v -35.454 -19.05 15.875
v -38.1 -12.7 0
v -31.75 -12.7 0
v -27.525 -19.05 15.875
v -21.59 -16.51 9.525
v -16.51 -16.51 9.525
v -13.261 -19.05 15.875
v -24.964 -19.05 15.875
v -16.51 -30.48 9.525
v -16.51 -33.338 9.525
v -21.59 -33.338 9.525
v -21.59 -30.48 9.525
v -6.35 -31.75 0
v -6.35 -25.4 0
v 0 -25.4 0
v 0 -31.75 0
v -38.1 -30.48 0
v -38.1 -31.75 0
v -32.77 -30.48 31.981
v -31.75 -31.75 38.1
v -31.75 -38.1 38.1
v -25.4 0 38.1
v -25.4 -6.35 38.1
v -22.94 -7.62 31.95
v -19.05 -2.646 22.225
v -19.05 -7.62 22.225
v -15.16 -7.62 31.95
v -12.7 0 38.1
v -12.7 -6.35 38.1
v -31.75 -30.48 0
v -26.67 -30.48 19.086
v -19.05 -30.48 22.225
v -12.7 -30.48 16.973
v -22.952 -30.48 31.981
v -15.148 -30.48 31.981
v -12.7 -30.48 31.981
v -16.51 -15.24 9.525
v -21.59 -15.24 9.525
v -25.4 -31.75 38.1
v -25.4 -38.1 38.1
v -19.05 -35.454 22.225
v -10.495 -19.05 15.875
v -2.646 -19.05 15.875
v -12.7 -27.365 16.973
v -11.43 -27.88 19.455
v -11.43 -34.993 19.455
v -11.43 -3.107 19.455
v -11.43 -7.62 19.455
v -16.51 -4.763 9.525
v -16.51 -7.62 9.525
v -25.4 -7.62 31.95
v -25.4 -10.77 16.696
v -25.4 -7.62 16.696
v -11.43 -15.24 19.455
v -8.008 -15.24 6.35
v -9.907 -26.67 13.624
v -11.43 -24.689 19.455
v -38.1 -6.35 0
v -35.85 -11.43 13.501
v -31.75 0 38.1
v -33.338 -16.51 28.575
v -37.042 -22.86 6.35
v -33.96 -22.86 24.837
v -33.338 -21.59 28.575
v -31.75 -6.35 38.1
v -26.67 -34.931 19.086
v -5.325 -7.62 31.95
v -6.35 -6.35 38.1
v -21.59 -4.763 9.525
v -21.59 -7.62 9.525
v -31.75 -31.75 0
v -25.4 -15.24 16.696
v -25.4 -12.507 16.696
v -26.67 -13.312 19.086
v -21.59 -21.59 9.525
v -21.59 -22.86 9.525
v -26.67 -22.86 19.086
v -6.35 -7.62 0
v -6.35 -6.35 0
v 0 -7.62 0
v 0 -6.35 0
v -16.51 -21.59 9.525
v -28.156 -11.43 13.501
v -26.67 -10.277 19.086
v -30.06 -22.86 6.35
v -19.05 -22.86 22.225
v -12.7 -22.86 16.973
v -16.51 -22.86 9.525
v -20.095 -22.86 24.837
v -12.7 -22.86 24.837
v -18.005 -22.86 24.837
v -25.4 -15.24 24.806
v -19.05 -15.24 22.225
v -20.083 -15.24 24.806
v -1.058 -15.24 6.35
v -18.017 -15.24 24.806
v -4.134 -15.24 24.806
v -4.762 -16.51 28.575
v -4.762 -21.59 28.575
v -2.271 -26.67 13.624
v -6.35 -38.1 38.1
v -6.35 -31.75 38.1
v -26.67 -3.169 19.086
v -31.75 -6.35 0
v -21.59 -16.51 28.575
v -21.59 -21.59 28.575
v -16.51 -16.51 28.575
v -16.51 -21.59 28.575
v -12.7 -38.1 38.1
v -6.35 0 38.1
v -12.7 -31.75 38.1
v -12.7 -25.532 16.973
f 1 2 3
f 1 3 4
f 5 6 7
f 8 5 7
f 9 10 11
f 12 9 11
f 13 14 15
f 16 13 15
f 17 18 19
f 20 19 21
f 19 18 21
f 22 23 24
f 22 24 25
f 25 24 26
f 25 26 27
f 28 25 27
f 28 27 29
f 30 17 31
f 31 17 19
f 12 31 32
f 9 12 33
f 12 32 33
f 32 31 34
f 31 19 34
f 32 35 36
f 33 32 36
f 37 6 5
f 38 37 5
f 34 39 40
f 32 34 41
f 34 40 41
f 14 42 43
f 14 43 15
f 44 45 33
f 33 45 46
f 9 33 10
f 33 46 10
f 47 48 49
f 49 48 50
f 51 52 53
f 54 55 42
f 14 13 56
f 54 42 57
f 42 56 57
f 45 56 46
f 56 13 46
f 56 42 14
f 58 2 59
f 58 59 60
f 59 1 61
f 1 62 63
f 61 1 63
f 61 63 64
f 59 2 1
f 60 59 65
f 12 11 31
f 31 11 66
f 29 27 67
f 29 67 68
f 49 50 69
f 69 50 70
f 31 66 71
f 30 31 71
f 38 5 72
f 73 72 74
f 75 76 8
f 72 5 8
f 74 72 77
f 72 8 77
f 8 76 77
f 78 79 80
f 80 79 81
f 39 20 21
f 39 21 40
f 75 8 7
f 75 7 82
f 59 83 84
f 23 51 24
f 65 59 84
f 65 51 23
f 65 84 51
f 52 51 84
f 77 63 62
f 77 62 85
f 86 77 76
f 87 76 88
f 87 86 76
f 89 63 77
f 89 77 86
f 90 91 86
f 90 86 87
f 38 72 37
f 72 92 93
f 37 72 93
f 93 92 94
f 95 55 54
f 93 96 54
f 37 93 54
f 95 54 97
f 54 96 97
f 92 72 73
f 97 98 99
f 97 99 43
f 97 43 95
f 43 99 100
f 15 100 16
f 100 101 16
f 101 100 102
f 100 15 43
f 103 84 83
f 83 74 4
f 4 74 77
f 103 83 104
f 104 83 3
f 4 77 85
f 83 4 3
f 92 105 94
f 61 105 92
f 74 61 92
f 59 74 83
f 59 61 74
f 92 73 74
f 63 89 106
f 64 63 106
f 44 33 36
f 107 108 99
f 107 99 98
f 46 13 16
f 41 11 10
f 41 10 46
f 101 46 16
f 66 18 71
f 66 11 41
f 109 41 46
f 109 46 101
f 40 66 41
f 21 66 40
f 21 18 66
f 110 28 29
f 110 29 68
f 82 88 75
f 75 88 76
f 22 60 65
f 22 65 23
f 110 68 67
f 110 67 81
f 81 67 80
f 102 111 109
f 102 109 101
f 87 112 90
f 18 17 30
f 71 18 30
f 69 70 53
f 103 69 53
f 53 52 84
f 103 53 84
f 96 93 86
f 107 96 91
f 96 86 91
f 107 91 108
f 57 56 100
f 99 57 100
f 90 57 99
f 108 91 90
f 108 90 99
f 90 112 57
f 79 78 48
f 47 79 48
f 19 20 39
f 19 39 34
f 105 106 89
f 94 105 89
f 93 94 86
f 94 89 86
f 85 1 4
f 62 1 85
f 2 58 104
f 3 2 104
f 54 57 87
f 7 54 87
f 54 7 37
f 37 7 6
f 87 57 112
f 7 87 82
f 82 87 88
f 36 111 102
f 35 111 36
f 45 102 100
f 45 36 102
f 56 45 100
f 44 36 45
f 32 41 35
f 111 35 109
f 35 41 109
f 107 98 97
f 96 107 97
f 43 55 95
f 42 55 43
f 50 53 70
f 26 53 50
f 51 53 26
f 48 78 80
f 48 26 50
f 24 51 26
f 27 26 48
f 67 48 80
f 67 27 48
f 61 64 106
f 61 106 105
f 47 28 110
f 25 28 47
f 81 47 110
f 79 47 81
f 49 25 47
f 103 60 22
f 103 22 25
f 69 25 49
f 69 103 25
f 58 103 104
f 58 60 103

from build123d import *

# Parameters (mm, degrees)
F0_W      = 38.1
F0_H      = 38.1
F1_DEPTH  = 38.1
F6_DEPTH  = 38.1
F8_DEPTH  = 38.1
F9_W      = 25.4
F9_H      = 7.62
F10_DEPTH = 38.1


with BuildPart() as f1:
    # F0 (on Front) → F1 (new body)
    with BuildSketch(Plane.XZ):
        with Locations((-19.05, 19.05)):
            Rectangle(F0_W, F0_H)
    extrude(amount=F1_DEPTH)

    # F5 (on offset) → F6 (cut)
    with BuildSketch(Plane.YZ.offset(-38.1)):
        Polygon((-11.43, 13.500985), (-6.35, 38.1), (-31.75, 38.1), (-26.67, 13.624078), (-21.59, 28.575), (-16.51, 28.575), align=None)
        Polygon((-25.4, 0), (-12.7, 0), (-19.05, 15.875), align=None)
        Polygon((-6.35, 0), (0, 0), (0, 38.1), align=None)
        Polygon((-31.75, 0), (-38.1, 38.1), (-38.1, 0), align=None)
    extrude(amount=F6_DEPTH, mode=Mode.SUBTRACT)

    # F7 (on offset) → F8 (cut)
    with BuildSketch(Plane.XZ.offset(38.1)):
        Polygon((-31.75, 0), (-6.35, 0), (-11.43, 19.455044), (-16.51, 9.525), (-21.59, 9.525), (-26.67, 19.085767), align=None)
        Polygon((-6.35, 38.1), (0, 0), (0, 38.1), align=None)
        Polygon((-19.05, 22.225), (-12.7, 38.1), (-25.4, 38.1), align=None)
        Polygon((-38.1, 38.1), (-38.1, 0), (-31.75, 38.1), align=None)
    extrude(amount=-F8_DEPTH, mode=Mode.SUBTRACT)

    # F9 (on offset) → F10 (cut)
    with BuildSketch(Plane.XY.offset(38.1)):
        with Locations((-12.7, -11.43)):
            Rectangle(F9_W, F9_H)
        with Locations((-25.4, -26.67)):
            Rectangle(F9_W, F9_H)
    extrude(amount=-F10_DEPTH, mode=Mode.SUBTRACT)


solid = f1.part
